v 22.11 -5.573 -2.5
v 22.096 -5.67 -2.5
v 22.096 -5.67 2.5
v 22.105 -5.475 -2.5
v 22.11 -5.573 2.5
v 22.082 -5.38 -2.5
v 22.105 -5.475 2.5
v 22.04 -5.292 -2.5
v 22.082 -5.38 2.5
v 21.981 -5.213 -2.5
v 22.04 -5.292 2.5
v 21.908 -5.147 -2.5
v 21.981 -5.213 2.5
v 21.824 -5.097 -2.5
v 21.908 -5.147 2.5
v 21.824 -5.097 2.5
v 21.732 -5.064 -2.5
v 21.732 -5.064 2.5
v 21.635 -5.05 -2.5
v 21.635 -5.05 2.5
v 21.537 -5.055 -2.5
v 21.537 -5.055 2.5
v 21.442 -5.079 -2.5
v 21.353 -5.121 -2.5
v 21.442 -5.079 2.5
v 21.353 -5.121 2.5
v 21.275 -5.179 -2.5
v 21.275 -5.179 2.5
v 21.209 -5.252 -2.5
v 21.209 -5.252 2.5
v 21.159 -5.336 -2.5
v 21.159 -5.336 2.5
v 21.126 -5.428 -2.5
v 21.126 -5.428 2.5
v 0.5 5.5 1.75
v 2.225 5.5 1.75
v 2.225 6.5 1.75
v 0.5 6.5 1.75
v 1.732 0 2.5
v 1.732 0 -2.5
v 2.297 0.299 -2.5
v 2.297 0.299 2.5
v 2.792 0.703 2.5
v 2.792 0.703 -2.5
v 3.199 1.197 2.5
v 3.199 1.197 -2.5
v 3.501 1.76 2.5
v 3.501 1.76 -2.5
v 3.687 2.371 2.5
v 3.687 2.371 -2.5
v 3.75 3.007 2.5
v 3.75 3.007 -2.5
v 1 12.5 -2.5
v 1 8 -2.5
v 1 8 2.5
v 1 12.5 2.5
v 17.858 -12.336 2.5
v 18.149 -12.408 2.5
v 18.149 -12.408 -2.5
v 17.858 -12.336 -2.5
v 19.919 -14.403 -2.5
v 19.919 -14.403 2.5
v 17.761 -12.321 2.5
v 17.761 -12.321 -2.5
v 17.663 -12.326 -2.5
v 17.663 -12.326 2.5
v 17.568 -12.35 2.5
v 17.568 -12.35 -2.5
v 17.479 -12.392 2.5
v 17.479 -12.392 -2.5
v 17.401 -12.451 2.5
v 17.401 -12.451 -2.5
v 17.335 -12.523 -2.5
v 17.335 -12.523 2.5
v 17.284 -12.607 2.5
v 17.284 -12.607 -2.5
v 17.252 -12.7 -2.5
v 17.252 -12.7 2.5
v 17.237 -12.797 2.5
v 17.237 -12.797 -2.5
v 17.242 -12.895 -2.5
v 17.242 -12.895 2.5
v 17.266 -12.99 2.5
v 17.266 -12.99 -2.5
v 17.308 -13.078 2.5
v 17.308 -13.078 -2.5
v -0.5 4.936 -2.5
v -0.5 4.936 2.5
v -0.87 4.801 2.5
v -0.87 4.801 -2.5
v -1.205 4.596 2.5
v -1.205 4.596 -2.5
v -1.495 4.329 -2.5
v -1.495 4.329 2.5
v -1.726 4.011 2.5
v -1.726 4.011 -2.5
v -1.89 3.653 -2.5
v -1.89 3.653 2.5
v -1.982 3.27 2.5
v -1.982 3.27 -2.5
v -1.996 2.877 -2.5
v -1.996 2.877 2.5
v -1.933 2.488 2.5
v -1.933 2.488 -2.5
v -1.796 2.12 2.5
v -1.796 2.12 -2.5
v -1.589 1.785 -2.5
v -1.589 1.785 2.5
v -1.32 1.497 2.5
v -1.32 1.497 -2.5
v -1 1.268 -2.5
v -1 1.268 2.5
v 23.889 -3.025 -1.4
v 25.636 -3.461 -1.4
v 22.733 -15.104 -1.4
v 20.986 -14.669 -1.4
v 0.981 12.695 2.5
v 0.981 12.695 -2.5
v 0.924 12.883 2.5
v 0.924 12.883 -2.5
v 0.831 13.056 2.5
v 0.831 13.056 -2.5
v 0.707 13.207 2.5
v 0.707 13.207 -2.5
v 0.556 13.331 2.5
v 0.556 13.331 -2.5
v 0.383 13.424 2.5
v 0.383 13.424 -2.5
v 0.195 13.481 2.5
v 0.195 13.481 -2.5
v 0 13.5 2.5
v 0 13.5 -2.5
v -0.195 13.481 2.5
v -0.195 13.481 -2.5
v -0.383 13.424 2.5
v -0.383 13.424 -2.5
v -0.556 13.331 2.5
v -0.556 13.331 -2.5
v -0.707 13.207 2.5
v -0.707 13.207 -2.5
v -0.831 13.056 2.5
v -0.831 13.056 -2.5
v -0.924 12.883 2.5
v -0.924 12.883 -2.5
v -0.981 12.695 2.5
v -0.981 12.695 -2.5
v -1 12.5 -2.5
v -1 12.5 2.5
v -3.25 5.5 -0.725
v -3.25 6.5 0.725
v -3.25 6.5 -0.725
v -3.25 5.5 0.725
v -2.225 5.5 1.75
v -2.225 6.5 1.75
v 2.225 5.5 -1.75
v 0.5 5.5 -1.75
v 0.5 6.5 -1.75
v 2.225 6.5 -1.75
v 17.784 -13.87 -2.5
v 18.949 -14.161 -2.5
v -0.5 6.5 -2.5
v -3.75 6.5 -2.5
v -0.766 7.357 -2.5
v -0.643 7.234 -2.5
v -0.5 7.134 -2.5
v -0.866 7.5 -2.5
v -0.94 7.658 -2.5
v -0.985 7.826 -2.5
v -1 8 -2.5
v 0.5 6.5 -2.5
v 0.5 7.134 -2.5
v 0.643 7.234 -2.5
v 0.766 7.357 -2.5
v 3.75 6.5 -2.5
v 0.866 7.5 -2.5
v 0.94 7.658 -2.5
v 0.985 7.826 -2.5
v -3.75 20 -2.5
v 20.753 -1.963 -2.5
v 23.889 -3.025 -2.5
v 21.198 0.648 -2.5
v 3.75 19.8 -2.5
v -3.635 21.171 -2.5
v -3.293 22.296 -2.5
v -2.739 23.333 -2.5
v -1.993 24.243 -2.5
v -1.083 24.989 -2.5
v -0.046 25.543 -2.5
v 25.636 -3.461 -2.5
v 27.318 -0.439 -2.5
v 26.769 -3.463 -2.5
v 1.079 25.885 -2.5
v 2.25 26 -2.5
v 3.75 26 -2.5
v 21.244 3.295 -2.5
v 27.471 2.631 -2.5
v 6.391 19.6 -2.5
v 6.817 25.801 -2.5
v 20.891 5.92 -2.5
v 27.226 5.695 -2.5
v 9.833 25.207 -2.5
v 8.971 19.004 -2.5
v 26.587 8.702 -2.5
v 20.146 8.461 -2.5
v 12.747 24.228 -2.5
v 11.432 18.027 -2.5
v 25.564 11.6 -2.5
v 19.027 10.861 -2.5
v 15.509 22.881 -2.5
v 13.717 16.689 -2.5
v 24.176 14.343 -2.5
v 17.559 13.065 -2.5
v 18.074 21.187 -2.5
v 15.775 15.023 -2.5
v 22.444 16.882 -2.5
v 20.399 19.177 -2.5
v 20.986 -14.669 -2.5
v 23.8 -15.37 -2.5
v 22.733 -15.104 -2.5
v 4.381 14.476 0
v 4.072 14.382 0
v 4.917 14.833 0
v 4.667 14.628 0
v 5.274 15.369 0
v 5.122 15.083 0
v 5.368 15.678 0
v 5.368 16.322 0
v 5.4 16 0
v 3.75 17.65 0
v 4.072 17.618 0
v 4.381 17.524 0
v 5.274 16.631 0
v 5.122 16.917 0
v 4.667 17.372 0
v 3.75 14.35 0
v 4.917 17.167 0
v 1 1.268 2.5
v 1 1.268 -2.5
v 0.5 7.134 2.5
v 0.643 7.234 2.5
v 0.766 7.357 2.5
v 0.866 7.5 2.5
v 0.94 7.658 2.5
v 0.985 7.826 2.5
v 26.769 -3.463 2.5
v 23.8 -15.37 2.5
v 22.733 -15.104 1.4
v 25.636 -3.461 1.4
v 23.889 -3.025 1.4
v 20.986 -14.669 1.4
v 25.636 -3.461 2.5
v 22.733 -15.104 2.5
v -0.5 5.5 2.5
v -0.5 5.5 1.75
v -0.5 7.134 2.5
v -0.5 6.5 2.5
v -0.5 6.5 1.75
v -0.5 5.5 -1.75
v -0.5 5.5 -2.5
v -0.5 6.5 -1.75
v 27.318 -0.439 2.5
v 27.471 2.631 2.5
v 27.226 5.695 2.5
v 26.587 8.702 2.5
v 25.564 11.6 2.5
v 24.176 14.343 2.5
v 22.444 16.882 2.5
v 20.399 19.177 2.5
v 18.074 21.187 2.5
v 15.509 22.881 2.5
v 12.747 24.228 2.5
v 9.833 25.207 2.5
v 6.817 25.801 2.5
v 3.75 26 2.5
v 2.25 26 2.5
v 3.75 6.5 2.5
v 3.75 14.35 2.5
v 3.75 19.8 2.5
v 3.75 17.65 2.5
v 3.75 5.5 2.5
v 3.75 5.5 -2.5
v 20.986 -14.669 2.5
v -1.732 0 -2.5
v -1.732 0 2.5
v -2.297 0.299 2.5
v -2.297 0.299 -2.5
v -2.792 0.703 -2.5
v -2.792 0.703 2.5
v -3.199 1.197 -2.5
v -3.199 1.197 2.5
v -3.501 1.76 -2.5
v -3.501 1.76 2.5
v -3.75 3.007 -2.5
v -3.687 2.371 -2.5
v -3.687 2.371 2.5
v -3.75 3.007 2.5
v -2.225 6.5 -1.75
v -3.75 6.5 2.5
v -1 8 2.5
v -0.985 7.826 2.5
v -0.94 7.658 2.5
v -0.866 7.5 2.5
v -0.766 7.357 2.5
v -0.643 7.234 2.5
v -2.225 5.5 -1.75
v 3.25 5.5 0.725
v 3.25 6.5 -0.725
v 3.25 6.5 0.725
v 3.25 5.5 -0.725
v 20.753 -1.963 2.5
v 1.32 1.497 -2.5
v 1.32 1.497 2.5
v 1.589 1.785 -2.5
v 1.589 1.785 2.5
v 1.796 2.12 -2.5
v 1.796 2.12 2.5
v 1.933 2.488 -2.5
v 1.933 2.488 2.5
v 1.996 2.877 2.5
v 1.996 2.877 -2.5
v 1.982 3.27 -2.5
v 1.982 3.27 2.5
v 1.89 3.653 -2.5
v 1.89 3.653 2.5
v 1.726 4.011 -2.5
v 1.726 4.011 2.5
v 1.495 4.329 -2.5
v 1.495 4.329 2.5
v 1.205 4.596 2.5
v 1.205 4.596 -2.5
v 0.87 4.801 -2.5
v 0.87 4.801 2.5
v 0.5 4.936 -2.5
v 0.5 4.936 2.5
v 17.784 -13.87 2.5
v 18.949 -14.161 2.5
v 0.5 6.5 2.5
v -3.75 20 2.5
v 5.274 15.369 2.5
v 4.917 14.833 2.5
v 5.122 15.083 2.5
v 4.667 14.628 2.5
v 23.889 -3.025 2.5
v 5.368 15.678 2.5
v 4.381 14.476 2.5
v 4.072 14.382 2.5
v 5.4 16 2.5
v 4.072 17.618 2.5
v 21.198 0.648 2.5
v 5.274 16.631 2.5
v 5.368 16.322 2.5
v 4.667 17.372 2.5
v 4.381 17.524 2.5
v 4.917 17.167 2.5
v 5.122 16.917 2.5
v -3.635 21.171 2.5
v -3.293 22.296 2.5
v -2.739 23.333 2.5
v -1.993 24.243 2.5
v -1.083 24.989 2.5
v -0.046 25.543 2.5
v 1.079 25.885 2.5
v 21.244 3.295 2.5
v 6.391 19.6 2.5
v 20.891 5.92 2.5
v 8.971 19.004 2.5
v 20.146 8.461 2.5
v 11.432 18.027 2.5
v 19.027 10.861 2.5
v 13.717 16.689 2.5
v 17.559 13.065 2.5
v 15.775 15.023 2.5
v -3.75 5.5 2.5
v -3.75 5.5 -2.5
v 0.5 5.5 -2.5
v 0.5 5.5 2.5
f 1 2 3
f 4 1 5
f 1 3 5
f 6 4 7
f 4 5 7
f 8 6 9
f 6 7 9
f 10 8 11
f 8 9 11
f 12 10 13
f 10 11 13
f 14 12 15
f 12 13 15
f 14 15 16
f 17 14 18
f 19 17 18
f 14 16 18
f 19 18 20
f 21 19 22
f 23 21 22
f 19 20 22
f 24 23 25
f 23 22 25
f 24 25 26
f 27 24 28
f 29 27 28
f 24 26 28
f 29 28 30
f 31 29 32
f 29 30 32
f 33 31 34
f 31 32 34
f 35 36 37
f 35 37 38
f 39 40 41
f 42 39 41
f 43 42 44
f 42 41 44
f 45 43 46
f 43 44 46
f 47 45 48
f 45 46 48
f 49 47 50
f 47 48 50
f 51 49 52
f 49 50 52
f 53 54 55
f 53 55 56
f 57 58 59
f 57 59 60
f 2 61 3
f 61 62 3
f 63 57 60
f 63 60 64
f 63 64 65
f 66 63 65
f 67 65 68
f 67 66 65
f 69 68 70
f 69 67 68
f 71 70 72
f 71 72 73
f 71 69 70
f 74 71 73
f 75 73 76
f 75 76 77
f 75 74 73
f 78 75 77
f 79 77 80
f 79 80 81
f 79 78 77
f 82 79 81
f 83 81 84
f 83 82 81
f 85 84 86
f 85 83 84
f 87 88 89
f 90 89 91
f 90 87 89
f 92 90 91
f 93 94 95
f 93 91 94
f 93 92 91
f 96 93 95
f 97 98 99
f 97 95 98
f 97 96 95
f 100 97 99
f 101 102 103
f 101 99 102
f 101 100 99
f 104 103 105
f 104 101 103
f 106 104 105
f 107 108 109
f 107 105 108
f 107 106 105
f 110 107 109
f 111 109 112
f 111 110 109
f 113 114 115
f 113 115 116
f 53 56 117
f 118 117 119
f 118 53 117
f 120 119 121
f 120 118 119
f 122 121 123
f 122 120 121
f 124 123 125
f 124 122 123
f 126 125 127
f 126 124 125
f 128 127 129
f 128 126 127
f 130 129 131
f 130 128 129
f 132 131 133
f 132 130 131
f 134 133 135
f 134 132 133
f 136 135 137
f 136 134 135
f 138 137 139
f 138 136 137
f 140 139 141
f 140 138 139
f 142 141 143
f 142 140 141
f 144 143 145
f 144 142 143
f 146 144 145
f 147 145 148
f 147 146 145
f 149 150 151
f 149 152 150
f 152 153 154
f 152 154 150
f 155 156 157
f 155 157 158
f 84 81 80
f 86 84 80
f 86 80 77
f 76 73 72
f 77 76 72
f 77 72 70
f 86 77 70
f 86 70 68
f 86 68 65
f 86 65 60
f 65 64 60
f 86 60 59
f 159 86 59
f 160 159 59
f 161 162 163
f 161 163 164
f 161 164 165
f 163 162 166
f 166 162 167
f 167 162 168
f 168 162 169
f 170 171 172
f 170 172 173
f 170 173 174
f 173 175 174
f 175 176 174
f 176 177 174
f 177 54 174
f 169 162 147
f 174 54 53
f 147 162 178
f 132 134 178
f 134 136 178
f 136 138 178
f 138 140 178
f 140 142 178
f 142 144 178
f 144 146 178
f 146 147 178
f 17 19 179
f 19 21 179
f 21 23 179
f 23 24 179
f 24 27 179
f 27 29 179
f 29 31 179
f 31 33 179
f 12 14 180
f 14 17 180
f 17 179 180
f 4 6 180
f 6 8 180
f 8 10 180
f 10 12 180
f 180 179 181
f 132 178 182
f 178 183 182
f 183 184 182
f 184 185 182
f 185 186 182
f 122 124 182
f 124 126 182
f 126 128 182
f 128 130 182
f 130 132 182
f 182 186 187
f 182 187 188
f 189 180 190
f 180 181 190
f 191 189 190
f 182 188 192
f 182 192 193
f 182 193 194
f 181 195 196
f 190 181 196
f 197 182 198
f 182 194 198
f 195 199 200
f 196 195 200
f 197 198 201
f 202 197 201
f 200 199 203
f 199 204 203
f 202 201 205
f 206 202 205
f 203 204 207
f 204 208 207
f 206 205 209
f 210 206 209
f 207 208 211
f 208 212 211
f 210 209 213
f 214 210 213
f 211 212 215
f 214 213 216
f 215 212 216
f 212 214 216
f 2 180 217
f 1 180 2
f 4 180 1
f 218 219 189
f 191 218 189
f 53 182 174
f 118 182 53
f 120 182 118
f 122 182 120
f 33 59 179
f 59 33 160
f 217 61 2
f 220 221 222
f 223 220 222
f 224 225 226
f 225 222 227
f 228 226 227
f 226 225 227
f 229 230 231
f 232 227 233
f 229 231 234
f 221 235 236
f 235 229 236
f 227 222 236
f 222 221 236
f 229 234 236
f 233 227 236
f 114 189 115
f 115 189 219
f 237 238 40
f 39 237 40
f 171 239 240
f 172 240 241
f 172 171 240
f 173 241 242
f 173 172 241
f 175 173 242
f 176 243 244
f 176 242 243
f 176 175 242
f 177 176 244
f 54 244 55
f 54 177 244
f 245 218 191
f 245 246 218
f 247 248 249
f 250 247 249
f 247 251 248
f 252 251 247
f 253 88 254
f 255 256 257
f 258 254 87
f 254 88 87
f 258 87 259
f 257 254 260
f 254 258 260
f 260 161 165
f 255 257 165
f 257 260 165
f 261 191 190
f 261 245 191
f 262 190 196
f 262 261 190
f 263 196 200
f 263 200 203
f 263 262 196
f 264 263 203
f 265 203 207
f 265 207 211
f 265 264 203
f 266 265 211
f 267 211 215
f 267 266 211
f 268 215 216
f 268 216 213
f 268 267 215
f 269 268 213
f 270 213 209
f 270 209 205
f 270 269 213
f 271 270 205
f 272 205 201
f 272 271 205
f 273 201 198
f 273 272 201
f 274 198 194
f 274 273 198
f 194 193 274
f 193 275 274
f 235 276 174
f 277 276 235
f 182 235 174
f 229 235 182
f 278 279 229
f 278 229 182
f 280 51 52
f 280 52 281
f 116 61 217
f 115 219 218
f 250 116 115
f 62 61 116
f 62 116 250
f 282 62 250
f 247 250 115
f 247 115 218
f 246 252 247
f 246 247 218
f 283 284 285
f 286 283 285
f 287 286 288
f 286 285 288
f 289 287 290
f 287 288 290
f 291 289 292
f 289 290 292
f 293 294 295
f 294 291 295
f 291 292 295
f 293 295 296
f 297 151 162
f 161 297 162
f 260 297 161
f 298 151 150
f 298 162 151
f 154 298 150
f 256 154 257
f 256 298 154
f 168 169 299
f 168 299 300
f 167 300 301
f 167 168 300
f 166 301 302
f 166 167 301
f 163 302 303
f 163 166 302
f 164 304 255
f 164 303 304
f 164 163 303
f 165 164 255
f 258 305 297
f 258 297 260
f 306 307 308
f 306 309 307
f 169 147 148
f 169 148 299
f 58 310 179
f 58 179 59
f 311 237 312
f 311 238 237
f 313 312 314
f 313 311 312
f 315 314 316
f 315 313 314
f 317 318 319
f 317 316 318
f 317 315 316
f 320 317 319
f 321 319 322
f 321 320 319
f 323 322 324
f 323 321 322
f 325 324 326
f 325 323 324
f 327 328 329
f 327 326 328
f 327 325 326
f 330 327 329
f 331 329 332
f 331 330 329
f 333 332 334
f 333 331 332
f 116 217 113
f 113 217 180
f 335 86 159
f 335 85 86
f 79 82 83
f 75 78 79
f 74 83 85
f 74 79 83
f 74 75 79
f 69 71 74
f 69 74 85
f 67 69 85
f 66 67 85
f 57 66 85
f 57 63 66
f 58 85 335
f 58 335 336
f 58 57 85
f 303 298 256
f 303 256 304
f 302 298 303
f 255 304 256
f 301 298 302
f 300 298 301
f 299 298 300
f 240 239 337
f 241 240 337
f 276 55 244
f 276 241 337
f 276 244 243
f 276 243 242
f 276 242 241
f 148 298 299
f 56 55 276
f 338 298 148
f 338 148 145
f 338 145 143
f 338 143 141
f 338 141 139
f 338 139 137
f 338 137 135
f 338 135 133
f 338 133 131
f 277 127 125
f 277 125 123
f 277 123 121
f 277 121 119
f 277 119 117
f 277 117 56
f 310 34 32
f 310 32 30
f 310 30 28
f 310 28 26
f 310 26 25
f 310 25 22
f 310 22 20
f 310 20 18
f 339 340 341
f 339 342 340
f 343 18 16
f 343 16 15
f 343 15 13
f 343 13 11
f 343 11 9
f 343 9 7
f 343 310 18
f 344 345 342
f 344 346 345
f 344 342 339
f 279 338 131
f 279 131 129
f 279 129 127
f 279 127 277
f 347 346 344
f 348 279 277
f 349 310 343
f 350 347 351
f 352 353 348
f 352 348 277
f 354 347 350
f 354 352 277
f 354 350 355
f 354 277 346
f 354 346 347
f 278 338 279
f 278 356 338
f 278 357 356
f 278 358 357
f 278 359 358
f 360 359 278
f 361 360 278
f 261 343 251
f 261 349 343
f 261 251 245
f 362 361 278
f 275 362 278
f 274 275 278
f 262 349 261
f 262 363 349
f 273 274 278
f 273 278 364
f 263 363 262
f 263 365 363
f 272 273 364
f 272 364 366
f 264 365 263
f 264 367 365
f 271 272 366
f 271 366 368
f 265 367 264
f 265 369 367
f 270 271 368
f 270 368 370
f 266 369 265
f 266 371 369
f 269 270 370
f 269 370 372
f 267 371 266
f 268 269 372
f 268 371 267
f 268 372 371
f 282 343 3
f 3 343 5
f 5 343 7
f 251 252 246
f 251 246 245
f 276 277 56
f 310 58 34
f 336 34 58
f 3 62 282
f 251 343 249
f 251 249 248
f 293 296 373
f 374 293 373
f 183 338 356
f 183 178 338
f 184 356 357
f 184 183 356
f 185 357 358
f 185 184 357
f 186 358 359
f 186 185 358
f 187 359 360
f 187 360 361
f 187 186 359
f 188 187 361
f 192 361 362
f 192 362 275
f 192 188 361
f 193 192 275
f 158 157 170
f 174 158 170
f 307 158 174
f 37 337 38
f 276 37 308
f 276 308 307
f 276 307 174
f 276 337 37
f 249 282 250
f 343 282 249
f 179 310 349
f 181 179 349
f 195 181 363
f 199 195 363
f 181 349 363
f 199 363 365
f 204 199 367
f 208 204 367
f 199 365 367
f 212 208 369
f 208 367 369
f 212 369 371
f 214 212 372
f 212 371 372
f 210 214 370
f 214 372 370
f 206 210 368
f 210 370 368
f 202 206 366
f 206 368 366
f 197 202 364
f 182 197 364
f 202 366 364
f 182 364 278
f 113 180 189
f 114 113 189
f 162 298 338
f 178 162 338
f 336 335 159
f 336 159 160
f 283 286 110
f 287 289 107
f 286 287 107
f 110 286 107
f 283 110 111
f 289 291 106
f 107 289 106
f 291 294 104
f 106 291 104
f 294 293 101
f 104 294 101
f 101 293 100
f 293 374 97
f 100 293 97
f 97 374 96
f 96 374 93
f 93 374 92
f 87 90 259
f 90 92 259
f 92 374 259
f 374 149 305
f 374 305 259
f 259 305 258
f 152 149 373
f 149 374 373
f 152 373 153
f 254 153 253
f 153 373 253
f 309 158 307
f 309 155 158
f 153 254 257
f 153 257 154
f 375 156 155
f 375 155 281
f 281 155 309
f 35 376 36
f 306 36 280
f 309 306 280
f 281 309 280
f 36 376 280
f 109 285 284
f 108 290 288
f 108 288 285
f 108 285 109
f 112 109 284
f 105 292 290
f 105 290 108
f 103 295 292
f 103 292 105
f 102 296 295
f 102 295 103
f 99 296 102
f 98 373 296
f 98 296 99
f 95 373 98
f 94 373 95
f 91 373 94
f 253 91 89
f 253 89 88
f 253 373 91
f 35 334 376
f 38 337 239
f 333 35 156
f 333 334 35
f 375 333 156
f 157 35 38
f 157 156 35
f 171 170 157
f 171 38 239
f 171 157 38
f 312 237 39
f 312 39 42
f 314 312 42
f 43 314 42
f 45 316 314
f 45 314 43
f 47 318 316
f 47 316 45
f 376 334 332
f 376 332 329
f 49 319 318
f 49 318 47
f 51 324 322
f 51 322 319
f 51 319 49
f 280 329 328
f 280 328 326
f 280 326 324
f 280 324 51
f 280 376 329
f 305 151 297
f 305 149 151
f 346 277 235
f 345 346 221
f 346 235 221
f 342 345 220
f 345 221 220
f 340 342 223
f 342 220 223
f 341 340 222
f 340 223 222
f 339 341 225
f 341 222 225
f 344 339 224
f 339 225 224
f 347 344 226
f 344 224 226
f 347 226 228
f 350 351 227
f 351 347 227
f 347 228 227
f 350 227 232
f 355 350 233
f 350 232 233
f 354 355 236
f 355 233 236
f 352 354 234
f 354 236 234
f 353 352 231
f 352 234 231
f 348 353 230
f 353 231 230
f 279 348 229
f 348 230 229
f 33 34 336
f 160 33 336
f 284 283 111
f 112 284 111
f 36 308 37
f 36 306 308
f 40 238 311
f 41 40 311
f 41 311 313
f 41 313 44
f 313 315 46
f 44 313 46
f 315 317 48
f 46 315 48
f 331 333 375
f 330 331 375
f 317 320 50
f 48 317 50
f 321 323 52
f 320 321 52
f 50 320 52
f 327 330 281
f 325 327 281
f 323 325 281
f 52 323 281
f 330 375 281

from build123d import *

# Parameters (mm, degrees)
SKETCH003_W          = 7.5
SKETCH003_H          = 26
PAD_DEPTH            = 2.5
SKETCH004_R          = 1.65
PAD001_DEPTH         = 2.5
FILLET_R             = 6
SKETCH005_R          = 2
POCKET_DEPTH         = 2.501
POCKET_DEPTH_BACK    = 2.501
SKETCH006_W          = 1
SKETCH006_H          = 5
POCKET001_DEPTH      = 2.501
POCKET001_DEPTH_BACK = 2.501
POCKET002_DEPTH      = 58.526798
POCKET002_DEPTH_BACK = 58.526798
SKETCH009_W          = 7.5
SKETCH009_H          = 5
POCKET003_DEPTH      = 0.5
PAD002_DEPTH         = 2.5
POCKET004_DEPTH      = 2.501
POCKET004_DEPTH_BACK = 2.501
PAD003_DEPTH         = 2.5
POCKET005_DEPTH      = 1.1


with BuildPart() as part:
    # Sketch003 → Pad (new body, symmetric)
    with BuildSketch(Plane.XY):
        with Locations((0, 13)):
            Rectangle(SKETCH003_W, SKETCH003_H)
    extrude(amount=PAD_DEPTH, both=True)

    # Sketch004 → Pad001 (join)
    with BuildSketch(Plane.XY):
        with Locations((3.75, 16)):
            Circle(SKETCH004_R)
    extrude(amount=PAD001_DEPTH)

    # Fillet
    fillet_edges = [part.edges().sort_by_distance(p)[0] for p in [
        (-3.75, 26, 0),
    ]]
    fillet(fillet_edges, radius=FILLET_R)

    # Sketch005 → Pocket (cut, two sides)
    with BuildSketch(Plane.XY) as pocket_sk:
        with Locations((0, 3)):
            Circle(SKETCH005_R)
        with BuildLine():
            ThreePointArc((1, 12.5), (0, 13.5), (-1, 12.5))
            Line((-1, 12.5), (-1, 8))
            ThreePointArc((-1, 8), (0, 7), (1, 8))
            Line((1, 8), (1, 12.5))
        make_face()
    extrude(amount=-POCKET_DEPTH, mode=Mode.SUBTRACT)
    extrude(pocket_sk.sketch, amount=POCKET_DEPTH_BACK, mode=Mode.SUBTRACT)

    # Sketch006 → Pocket001 (cut, two sides)
    with BuildSketch(Plane.XY) as pocket001_sk:
        Polygon((-1.732051, 0), (0, 3), (1.732051, 0), align=None)
        with Locations((0, 5.5)):
            Rectangle(SKETCH006_W, SKETCH006_H)
    extrude(amount=-POCKET001_DEPTH, mode=Mode.SUBTRACT)
    extrude(pocket001_sk.sketch, amount=POCKET001_DEPTH_BACK, mode=Mode.SUBTRACT)

    # Sketch007 → Pocket002 (cut, two sides)
    with BuildSketch(Plane.XY) as pocket002_sk:
        with BuildLine():
            ThreePointArc((1.732051, 0), (3.198765, 1.196569), (3.75, 3.007416))
            Line((3.75, 0), (3.75, 3.007416))
            Line((1.732051, 0), (3.75, 0))
        make_face()
    pocket002 = extrude(amount=-POCKET002_DEPTH, mode=Mode.SUBTRACT) + extrude(pocket002_sk.sketch, amount=POCKET002_DEPTH_BACK, mode=Mode.SUBTRACT)

    # Mirrored: Pocket002 across YZ
    add(pocket002.mirror(Plane.YZ), mode=Mode.SUBTRACT)

    # Sketch009 → Pocket003 (cut, symmetric)
    with BuildSketch(Plane.XZ.offset(-6)):
        Rectangle(SKETCH009_W, SKETCH009_H)
        Polygon((-2.224874, 1.75), (-3.25, 0.724874), (-3.25, -0.724874), (-2.224874, -1.75), (2.224874, -1.75), (3.25, -0.724874), (3.25, 0.724874), (2.224874, 1.75), align=None, mode=Mode.SUBTRACT)
    extrude(amount=POCKET003_DEPTH, both=True, mode=Mode.SUBTRACT)

    # Sketch010 → Pad002 (join, symmetric)
    with BuildSketch(Plane.XY):
        with BuildLine():
            ThreePointArc((26.768892, -3.462839), (22.44444, 16.882113), (3.75, 26))
            Line((3.75, 19.8), (3.75, 26))
            ThreePointArc((20.753059, -1.962923), (17.558773, 13.065011), (3.75, 19.8))
            Line((20.753059, -1.962923), (17.784166, -13.8705))
            Line((17.784166, -13.8705), (23.8, -15.370416))
            Line((23.8, -15.370416), (26.768892, -3.462839))
        make_face()
    extrude(amount=PAD002_DEPTH, both=True)

    # Sketch011 → Pocket004 (cut, two sides)
    with BuildSketch(Plane.XY) as pocket004_sk:
        with BuildLine():
            ThreePointArc((18.948521, -14.160807), (19.312708, -14.766915), (19.918817, -14.402728))
            Line((19.918817, -14.402728), (22.096114, -5.670067))
            ThreePointArc((22.096114, -5.670067), (21.731927, -5.063958), (21.125818, -5.428145))
            Line((21.125818, -5.428145), (18.948521, -14.160807))
        make_face()
    extrude(amount=-POCKET004_DEPTH, mode=Mode.SUBTRACT)
    extrude(pocket004_sk.sketch, amount=POCKET004_DEPTH_BACK, mode=Mode.SUBTRACT)

    # Sketch012 → Pad003 (join, symmetric)
    with BuildSketch(Plane.XY):
        with BuildLine():
            Line((17.784166, -13.8705), (18.148769, -12.408161))
            Line((18.148769, -12.408161), (17.85768, -12.335584))
            ThreePointArc((17.85768, -12.335584), (17.334791, -12.523321), (17.308135, -13.078251))
            Line((17.308135, -13.078251), (17.784166, -13.8705))
        make_face()
    extrude(amount=PAD003_DEPTH, both=True)

    # Sketch013 → Pocket005 (cut)
    with BuildSketch(Plane.XY.offset(2.5)):
        Polygon((20.986142, -14.668843), (23.889205, -3.025294), (25.635737, -3.460753), (22.732675, -15.104302), align=None)
    pocket005 = extrude(amount=-POCKET005_DEPTH, mode=Mode.SUBTRACT)

    # Mirrored001: Pocket005 across XY
    add(pocket005.mirror(Plane.XY), mode=Mode.SUBTRACT)


solid = part.part
